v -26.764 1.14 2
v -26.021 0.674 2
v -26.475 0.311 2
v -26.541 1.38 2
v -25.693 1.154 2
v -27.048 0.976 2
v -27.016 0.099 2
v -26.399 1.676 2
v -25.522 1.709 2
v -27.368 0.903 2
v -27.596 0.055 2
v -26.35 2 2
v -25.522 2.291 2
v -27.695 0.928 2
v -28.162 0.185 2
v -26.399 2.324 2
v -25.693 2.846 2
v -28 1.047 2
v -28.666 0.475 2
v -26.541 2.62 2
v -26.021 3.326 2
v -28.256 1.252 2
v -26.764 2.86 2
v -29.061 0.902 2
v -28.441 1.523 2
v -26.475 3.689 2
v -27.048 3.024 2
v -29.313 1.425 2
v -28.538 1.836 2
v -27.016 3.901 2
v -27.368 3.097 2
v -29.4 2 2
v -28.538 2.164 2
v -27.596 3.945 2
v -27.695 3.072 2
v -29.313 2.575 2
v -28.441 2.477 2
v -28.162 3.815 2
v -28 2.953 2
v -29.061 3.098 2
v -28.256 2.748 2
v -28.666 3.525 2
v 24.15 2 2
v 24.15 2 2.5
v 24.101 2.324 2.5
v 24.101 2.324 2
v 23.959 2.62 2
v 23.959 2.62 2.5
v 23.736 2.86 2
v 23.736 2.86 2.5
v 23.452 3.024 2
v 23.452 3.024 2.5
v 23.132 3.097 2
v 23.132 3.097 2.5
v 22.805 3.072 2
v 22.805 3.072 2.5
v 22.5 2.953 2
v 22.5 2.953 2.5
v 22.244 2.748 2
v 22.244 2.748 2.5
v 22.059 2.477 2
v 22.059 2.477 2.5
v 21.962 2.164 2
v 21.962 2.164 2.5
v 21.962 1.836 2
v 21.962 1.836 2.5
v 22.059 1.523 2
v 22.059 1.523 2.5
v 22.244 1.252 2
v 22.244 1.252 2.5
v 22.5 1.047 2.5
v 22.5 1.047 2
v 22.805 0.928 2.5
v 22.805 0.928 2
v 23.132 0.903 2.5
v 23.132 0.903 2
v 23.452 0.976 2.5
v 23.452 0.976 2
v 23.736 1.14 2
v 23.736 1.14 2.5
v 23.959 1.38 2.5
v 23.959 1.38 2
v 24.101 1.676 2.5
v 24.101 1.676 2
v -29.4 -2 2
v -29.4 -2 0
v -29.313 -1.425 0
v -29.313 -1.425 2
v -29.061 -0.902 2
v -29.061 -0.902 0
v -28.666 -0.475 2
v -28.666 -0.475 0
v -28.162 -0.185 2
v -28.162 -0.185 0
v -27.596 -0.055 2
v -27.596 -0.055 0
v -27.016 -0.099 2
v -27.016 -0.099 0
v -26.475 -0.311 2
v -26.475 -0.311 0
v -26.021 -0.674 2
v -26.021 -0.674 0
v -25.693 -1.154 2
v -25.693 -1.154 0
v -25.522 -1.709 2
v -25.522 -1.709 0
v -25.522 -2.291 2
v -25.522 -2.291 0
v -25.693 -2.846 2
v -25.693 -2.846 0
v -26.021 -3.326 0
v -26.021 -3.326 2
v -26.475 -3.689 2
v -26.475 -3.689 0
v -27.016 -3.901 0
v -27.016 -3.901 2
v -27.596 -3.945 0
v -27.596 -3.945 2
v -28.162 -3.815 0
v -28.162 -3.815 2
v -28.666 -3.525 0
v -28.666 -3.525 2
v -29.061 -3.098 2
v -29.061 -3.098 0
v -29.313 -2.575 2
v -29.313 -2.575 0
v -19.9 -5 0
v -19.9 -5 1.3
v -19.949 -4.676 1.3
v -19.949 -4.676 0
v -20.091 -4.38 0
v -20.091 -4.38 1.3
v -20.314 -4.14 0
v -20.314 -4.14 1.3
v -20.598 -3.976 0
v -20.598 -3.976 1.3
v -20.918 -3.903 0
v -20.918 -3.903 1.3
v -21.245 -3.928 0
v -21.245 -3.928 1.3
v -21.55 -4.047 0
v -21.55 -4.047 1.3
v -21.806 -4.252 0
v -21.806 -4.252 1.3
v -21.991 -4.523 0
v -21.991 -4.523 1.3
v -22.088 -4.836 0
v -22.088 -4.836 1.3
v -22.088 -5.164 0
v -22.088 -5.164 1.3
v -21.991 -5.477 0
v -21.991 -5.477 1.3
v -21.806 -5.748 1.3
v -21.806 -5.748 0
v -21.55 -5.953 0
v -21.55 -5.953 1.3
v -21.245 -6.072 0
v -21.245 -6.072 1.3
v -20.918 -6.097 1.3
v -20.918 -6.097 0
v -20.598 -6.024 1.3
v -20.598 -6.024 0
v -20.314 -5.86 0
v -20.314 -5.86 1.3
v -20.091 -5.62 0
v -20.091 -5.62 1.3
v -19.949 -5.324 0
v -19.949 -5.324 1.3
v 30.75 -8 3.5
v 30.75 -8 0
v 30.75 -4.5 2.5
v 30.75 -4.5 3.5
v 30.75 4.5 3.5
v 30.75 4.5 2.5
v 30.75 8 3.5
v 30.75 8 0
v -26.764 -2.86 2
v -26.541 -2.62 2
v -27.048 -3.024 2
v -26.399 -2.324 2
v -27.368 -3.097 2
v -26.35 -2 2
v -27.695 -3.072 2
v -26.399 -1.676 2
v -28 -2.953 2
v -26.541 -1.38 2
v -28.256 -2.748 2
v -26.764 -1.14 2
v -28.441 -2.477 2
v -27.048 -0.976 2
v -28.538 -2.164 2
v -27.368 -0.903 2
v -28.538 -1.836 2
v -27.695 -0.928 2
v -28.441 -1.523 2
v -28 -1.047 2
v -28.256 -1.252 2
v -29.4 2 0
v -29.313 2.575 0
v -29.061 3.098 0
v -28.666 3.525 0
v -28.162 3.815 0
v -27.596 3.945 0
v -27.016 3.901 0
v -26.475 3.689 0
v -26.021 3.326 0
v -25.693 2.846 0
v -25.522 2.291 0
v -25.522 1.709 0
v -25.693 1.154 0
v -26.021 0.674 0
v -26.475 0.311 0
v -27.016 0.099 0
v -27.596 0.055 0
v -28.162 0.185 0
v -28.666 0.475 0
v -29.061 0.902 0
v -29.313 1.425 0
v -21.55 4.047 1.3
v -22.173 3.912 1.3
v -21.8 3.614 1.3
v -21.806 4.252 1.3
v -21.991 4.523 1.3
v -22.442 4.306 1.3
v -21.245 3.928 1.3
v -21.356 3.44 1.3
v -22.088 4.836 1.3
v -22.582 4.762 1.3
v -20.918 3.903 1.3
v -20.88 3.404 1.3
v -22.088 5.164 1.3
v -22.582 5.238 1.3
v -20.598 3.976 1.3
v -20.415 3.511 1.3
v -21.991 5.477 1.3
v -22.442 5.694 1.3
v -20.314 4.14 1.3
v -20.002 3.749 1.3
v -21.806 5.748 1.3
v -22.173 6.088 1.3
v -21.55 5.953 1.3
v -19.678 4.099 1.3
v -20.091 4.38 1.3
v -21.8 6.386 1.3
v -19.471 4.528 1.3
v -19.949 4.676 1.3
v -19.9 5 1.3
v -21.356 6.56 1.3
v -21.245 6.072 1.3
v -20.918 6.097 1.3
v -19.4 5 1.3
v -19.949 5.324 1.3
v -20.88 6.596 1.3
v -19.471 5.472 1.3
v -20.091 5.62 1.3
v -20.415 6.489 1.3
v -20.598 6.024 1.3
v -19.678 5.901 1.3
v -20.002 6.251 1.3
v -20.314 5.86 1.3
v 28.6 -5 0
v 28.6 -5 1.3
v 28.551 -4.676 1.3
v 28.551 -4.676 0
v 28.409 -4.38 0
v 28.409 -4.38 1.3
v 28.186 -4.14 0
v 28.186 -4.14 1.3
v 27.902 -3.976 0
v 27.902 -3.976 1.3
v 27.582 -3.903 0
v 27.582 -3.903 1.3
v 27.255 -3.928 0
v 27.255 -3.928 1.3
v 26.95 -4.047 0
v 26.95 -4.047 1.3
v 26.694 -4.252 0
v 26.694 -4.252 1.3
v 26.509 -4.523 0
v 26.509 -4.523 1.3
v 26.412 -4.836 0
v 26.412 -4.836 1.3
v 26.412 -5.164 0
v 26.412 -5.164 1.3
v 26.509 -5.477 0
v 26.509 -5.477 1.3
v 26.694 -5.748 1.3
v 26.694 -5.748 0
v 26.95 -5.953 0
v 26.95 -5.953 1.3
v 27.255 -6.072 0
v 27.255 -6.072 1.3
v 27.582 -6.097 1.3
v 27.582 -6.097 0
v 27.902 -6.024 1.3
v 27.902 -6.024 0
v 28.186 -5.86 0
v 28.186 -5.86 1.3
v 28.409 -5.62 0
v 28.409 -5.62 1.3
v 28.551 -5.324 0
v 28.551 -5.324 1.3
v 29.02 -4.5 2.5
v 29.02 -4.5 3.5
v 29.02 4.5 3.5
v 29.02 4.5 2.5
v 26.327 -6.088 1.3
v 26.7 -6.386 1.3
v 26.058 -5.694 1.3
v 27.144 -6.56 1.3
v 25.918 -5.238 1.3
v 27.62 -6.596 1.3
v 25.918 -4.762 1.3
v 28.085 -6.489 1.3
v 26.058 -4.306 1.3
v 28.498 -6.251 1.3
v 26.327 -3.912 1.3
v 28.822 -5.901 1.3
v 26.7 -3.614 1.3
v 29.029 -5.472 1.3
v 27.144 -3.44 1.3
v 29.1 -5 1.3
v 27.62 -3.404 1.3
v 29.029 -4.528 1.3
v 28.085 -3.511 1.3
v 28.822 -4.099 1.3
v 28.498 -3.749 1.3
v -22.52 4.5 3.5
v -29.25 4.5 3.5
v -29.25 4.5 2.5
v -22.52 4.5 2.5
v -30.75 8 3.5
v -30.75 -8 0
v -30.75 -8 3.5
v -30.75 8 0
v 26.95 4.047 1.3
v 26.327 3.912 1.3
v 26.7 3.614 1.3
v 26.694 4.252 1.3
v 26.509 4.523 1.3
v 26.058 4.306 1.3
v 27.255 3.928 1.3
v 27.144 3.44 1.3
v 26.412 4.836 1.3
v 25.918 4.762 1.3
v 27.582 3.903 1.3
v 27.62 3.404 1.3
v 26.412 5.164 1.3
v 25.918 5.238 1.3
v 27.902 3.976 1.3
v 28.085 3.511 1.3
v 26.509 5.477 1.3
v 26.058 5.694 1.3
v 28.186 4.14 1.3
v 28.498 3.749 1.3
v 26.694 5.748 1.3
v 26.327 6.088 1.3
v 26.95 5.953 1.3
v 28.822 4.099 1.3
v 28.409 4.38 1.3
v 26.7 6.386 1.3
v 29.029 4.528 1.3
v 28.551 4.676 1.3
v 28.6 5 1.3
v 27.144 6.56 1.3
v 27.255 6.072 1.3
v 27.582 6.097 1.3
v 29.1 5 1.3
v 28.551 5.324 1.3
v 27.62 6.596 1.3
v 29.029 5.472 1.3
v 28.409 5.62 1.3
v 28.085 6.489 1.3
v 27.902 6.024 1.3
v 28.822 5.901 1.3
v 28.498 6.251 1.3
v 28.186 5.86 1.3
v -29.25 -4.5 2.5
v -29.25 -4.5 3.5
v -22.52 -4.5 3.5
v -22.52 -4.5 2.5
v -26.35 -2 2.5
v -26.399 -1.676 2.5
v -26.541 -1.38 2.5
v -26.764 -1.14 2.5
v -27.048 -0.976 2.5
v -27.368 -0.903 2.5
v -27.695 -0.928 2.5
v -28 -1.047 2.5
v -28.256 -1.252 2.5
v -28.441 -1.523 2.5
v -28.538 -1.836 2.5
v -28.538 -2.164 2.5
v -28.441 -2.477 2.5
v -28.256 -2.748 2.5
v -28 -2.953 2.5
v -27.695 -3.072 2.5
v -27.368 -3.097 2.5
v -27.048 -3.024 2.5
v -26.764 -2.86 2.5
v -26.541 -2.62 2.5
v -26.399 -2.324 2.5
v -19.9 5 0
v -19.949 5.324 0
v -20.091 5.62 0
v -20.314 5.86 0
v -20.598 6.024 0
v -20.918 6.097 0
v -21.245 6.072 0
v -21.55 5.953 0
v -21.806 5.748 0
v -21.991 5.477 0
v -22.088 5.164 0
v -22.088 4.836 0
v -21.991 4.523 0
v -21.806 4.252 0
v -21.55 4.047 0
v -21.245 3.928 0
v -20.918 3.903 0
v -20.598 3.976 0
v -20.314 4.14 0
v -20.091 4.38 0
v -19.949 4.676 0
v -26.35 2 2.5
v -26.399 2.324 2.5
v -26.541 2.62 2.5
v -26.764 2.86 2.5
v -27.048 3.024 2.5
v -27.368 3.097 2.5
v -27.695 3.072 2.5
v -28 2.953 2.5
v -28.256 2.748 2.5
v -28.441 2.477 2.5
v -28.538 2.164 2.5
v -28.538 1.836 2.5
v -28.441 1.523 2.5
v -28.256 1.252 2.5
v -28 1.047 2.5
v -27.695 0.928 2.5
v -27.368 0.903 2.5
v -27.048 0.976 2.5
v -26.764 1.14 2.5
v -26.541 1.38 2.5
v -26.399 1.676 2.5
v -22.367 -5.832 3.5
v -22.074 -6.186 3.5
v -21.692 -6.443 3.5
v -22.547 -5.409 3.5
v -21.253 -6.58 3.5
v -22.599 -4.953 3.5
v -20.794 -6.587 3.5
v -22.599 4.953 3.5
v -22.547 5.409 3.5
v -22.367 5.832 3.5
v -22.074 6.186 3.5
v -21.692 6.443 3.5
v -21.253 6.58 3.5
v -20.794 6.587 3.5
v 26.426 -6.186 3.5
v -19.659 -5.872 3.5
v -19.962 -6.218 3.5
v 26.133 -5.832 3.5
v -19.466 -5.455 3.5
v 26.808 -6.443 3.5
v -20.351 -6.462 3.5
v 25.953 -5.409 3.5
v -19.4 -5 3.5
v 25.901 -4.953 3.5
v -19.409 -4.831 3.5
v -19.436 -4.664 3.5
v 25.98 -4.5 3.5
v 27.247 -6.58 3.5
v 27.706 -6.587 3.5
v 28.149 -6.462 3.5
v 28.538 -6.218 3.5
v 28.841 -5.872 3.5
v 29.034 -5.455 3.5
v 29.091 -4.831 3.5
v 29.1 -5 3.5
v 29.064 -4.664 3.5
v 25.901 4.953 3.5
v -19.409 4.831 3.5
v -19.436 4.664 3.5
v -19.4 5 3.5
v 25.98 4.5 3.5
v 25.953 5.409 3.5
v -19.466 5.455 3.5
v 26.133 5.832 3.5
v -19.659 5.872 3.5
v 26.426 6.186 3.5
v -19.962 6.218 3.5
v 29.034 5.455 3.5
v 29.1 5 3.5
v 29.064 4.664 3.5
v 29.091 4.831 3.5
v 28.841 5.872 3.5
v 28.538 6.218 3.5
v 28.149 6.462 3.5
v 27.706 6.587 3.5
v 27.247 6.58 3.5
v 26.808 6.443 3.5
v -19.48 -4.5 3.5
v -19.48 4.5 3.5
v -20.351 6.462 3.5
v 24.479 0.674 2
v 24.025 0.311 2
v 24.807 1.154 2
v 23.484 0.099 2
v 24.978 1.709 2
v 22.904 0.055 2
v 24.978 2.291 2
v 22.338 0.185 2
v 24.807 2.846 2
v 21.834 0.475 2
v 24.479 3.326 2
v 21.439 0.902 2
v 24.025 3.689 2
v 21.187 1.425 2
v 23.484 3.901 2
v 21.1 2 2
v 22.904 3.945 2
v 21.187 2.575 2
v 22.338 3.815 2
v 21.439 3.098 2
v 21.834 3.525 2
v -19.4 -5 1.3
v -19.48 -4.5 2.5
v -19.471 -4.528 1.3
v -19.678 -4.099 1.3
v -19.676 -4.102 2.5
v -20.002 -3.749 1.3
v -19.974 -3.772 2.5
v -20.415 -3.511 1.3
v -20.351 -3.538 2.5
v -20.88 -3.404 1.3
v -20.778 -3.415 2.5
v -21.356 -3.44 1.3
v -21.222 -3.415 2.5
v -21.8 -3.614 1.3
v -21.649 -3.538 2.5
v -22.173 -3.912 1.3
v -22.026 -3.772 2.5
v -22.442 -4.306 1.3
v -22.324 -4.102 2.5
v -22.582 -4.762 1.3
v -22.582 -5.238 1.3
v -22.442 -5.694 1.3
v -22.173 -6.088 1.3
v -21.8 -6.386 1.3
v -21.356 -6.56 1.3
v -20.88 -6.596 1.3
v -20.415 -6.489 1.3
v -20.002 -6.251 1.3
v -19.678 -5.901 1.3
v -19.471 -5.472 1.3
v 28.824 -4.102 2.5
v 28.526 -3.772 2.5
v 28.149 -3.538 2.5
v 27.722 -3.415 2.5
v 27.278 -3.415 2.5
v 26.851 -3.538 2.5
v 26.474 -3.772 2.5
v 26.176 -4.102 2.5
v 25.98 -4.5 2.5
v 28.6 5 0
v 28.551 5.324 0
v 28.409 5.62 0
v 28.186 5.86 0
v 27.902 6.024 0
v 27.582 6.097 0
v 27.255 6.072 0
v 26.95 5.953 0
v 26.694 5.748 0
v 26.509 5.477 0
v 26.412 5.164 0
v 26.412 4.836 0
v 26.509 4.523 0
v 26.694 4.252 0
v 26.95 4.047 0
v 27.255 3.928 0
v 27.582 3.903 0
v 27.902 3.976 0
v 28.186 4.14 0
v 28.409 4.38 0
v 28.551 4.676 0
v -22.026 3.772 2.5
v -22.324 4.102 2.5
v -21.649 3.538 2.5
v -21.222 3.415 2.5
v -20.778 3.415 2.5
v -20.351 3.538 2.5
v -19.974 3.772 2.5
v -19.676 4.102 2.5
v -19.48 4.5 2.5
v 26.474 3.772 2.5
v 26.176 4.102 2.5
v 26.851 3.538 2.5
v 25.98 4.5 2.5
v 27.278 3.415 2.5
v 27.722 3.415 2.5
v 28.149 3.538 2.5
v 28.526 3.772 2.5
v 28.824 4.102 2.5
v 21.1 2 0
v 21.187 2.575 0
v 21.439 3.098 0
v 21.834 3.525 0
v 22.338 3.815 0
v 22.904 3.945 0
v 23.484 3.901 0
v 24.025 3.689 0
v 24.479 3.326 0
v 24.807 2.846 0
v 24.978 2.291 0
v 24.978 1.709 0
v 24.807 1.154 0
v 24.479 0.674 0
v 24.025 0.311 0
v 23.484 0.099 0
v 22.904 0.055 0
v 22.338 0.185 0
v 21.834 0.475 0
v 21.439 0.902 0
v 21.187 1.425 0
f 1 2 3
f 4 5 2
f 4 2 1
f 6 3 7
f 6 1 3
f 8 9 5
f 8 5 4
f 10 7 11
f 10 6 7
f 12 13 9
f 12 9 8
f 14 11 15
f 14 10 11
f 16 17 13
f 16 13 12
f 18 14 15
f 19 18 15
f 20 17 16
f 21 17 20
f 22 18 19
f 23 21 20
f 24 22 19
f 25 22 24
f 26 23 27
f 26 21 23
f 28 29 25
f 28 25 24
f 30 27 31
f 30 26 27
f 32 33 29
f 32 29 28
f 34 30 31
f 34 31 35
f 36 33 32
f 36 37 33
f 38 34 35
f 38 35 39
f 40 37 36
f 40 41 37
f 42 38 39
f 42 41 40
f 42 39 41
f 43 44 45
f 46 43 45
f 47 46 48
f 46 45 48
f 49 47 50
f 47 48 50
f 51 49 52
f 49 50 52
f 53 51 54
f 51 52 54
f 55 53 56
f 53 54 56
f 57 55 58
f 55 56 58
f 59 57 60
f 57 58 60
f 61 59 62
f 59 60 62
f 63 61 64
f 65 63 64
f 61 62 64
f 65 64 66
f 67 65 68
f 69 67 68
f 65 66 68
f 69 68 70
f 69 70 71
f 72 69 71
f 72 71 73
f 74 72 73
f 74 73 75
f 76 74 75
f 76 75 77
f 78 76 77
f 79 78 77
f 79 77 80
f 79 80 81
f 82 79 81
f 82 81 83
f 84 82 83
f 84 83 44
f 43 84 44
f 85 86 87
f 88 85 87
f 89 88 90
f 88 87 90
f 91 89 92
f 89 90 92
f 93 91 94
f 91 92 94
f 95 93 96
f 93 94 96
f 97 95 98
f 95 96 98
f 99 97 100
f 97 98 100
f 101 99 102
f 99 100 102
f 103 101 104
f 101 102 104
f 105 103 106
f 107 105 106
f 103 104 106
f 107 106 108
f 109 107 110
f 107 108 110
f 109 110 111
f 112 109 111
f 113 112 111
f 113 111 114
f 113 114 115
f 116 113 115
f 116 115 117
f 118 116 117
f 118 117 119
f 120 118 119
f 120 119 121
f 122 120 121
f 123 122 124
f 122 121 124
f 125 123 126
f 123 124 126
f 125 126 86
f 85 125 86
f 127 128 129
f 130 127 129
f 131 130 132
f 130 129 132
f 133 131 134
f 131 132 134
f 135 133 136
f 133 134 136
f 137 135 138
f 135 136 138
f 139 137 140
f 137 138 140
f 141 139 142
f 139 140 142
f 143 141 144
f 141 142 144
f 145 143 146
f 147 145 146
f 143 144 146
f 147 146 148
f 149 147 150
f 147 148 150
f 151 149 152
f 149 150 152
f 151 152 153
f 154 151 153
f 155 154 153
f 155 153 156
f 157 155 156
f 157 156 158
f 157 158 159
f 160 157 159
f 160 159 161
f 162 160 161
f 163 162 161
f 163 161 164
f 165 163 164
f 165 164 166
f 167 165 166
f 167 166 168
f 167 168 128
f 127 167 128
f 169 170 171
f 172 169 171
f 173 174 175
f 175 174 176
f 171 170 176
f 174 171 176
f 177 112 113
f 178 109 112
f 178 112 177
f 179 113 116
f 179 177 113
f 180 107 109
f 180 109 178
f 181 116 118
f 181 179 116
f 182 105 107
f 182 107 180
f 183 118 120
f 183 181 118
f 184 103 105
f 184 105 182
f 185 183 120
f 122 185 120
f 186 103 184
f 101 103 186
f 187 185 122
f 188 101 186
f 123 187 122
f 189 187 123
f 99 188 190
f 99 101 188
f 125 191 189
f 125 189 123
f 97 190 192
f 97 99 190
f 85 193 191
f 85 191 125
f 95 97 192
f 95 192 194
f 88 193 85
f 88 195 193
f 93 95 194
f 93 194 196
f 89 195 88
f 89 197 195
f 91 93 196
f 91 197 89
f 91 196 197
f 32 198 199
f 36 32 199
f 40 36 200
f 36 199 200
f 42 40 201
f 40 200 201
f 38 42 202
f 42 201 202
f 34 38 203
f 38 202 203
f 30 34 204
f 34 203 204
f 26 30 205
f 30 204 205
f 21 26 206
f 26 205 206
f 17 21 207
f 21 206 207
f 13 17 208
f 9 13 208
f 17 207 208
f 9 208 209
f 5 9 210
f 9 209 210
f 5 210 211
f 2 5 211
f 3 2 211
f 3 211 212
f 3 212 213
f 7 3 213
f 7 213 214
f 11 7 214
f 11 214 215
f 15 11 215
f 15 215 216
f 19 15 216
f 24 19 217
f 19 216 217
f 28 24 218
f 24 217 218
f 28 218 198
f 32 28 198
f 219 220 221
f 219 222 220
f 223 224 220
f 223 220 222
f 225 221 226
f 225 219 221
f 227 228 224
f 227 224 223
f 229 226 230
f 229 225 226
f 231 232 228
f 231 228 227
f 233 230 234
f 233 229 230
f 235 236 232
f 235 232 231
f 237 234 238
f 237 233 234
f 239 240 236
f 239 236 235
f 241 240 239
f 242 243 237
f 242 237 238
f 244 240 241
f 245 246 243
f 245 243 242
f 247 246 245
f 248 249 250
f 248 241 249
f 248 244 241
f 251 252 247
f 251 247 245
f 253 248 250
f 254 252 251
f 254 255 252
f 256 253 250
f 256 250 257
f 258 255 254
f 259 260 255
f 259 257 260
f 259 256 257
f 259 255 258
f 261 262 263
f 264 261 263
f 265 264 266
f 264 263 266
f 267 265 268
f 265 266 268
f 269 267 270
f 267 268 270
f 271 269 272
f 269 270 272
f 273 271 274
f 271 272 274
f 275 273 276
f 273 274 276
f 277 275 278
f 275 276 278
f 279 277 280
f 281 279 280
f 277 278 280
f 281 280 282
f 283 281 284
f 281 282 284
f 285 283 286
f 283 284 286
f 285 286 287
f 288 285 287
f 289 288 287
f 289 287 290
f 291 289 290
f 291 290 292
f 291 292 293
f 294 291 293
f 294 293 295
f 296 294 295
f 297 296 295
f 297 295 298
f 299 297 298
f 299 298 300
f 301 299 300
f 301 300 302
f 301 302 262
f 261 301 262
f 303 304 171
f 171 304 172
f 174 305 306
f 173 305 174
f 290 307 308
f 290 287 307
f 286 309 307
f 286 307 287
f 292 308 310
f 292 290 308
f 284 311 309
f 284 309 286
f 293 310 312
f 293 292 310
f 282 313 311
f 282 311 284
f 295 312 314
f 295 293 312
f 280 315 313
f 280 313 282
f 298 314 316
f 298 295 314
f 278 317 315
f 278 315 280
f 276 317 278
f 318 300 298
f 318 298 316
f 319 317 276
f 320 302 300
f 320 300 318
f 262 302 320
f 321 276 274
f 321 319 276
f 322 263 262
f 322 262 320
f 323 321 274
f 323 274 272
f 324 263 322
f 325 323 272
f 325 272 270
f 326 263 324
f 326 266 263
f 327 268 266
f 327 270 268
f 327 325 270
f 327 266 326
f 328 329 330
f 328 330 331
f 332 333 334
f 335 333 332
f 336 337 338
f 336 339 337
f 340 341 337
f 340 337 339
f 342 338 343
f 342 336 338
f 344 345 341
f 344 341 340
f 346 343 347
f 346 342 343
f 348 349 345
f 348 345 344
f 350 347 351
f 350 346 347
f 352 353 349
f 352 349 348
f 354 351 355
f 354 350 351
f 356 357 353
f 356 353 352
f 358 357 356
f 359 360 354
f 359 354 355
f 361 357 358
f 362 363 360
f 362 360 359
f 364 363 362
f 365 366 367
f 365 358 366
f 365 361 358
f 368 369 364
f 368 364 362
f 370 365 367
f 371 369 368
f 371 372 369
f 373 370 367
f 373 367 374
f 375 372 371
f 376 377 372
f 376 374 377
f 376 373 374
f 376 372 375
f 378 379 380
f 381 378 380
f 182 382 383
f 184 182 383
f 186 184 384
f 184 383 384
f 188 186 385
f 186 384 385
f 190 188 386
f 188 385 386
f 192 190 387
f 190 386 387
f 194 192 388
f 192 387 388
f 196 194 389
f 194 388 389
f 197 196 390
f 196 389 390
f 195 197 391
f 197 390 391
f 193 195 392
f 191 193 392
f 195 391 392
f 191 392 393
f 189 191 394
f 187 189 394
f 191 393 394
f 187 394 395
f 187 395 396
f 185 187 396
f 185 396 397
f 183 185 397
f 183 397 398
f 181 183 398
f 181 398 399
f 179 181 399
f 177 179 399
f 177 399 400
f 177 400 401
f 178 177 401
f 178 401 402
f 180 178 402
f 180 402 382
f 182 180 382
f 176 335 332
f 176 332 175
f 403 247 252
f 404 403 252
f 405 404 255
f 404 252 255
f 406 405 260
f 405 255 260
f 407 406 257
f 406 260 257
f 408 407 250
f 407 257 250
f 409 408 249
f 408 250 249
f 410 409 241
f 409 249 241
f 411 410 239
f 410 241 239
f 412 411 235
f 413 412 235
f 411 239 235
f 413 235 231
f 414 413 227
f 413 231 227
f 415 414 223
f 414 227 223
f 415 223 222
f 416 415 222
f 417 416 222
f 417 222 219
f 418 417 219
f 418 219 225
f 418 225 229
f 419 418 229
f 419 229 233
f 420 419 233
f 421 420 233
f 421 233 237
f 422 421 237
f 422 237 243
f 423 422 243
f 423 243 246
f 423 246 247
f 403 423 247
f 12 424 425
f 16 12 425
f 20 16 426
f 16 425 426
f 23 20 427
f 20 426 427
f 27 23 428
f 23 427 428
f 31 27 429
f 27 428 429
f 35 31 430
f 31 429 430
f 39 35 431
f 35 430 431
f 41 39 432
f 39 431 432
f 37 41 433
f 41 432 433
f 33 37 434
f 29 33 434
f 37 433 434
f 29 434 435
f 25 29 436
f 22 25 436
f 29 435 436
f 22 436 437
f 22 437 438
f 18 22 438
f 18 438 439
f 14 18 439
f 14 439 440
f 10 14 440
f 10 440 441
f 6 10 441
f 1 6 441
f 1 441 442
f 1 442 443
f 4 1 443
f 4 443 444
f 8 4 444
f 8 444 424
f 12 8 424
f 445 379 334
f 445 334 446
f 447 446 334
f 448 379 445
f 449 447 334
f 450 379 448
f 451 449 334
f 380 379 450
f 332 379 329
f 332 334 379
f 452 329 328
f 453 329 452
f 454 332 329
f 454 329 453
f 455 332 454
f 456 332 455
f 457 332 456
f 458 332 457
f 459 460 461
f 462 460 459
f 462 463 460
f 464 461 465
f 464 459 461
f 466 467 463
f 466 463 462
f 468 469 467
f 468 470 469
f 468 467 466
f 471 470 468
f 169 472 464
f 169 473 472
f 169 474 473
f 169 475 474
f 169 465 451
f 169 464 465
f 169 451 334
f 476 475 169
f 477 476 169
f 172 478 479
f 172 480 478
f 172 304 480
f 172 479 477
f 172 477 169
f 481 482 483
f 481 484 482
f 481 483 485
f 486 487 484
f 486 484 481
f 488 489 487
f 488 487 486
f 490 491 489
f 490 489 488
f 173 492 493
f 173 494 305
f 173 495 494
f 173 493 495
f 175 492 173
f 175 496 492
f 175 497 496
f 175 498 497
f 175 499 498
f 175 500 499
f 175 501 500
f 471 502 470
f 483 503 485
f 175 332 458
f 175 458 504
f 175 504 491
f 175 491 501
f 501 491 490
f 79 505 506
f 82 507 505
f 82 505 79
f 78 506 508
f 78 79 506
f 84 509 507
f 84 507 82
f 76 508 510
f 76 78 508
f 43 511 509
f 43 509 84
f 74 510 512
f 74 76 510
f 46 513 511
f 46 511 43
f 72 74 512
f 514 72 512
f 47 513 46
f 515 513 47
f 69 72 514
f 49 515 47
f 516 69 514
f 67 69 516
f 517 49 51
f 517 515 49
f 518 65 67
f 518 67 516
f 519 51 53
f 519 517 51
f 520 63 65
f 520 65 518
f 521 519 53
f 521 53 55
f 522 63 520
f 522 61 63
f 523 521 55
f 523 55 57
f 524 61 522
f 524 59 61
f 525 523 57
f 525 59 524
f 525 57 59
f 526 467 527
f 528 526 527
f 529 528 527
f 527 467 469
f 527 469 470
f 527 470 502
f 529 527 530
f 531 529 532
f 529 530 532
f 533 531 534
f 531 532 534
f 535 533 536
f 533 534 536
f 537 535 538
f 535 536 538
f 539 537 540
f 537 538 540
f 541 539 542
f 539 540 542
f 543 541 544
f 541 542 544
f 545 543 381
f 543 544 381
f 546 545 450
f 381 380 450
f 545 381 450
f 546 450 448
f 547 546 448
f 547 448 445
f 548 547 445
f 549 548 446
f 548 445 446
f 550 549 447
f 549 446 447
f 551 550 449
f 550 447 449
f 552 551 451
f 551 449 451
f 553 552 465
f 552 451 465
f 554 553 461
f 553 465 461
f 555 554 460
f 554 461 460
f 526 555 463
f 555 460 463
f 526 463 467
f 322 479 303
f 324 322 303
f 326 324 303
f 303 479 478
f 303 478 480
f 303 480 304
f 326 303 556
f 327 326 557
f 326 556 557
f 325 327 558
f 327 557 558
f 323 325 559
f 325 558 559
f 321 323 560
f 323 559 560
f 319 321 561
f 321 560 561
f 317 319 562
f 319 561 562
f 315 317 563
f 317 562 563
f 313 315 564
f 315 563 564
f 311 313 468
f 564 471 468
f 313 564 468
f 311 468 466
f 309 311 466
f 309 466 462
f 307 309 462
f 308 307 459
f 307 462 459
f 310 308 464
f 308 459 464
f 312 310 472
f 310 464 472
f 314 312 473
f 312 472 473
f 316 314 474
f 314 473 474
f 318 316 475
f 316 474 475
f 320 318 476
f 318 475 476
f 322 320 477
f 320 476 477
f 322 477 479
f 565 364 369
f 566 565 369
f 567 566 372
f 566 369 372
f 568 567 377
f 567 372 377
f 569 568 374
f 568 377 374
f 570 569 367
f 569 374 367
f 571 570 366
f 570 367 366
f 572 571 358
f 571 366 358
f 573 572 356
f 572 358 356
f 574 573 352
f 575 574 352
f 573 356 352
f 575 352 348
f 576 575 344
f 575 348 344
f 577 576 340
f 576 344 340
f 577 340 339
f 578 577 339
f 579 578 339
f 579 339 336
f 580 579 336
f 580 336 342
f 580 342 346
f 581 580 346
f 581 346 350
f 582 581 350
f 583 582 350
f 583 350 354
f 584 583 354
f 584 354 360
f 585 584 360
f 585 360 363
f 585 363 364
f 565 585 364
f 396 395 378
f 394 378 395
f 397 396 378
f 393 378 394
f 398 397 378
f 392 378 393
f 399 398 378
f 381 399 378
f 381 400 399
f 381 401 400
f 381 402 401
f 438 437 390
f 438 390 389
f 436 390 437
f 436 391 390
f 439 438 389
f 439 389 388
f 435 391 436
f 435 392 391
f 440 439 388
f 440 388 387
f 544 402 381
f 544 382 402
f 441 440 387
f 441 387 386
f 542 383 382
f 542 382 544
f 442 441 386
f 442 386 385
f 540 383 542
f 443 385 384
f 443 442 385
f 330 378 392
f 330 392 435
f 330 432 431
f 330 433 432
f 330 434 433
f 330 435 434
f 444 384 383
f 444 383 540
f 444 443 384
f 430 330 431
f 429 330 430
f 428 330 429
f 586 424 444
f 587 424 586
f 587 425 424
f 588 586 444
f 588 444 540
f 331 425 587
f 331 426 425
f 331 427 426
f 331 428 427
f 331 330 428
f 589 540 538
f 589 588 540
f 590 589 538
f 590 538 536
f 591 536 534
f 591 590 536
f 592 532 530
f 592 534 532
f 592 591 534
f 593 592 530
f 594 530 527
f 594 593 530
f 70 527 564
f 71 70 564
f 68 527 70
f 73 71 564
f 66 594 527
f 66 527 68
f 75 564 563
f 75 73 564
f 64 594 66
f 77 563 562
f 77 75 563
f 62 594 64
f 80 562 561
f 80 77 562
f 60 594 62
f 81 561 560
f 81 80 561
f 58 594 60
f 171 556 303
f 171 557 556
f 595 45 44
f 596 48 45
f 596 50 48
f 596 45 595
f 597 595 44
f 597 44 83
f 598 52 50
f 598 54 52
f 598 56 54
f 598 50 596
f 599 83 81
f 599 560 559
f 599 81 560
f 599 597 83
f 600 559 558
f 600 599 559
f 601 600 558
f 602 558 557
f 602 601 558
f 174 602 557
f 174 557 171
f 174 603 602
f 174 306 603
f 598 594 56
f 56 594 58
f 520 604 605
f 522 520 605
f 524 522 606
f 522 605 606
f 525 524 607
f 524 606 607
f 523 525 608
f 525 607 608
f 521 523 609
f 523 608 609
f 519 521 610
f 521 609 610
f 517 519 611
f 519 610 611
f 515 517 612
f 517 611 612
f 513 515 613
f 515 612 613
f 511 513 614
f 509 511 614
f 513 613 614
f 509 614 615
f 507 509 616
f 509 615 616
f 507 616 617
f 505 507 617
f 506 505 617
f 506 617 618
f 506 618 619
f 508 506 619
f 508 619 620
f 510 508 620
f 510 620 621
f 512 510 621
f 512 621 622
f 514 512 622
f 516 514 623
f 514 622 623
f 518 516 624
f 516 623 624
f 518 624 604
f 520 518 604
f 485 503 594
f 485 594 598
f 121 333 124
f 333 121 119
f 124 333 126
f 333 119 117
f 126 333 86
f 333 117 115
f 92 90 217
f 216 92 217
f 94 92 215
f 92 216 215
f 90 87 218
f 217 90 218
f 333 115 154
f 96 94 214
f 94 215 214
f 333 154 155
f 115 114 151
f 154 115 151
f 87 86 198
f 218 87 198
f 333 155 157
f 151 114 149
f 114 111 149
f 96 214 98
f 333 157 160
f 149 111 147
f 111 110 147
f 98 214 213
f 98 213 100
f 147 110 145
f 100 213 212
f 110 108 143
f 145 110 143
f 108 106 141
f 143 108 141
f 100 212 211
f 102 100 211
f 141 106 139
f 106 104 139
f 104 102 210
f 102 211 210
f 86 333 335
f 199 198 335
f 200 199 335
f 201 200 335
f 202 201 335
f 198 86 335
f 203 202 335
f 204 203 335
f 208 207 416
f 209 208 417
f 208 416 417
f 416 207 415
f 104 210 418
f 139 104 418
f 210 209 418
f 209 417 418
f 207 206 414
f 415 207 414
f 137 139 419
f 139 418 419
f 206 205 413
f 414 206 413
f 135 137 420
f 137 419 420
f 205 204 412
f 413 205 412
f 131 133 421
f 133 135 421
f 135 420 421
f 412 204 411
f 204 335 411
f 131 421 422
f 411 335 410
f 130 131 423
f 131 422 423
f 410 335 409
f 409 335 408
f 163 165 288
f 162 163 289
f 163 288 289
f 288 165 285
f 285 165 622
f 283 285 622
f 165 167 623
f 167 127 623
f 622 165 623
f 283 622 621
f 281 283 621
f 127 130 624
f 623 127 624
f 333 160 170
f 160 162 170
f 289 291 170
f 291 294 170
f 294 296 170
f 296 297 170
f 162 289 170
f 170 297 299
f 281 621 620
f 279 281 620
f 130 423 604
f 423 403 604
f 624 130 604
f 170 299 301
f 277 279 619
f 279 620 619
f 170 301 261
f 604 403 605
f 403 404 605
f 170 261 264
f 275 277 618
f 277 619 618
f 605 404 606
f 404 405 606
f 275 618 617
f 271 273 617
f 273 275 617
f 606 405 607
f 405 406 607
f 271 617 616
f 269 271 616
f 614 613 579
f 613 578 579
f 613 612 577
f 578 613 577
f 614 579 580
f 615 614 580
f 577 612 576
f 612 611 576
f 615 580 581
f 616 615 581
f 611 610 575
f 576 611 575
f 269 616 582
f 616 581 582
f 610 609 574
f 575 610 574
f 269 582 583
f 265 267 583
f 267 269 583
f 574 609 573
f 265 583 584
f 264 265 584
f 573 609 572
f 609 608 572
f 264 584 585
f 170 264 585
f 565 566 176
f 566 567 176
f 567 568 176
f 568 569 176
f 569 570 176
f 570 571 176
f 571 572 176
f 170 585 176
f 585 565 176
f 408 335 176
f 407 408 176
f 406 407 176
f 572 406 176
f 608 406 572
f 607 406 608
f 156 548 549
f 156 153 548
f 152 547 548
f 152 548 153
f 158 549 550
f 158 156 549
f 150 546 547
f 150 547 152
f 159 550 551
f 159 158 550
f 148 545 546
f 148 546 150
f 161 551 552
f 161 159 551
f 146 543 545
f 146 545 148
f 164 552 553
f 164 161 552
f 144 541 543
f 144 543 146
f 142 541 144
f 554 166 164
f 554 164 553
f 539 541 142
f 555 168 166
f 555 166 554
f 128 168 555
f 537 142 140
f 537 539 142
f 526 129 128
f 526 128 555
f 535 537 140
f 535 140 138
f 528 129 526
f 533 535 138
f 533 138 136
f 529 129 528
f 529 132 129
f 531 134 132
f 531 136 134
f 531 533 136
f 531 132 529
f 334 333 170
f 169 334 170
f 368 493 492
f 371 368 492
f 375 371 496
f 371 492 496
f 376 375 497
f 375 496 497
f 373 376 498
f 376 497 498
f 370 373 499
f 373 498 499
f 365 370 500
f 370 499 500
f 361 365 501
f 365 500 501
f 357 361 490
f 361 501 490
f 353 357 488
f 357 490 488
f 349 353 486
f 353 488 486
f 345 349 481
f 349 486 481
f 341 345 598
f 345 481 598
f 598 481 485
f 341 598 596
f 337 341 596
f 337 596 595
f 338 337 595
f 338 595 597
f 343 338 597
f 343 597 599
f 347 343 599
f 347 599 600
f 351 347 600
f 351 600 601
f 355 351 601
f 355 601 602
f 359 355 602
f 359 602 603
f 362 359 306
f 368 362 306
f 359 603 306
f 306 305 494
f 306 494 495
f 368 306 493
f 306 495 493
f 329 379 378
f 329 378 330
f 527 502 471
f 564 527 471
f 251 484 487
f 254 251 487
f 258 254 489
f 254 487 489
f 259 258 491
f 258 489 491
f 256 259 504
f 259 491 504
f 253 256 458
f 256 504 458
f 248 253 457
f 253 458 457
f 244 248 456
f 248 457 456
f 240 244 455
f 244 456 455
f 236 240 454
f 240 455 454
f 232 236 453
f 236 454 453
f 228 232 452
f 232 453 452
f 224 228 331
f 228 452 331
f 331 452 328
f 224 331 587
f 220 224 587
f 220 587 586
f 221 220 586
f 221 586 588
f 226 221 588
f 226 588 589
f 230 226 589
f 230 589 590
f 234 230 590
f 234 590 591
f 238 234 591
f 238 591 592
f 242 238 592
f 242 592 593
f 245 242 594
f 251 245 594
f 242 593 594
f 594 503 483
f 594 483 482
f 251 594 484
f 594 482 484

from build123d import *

# Parameters (mm, degrees)
SKETCH1_W           = 61.5
SKETCH1_H           = 16
BOSS_EXTRUDE1_DEPTH = 3.5
SKETCH5_W           = 60
SKETCH5_H           = 9
CUT_EXTRUDE3_DEPTH  = 1
SKETCH6_R           = 1.1
CUT_EXTRUDE4_DEPTH  = 32.871813566
SKETCH7_R           = 1.6
CUT_EXTRUDE5_DEPTH  = 2.2
SKETCH8_R           = 1.1
CUT_EXTRUDE6_DEPTH  = 32.871813566
SKETCH11_R          = 1.95
CUT_EXTRUDE10_DEPTH = 2


with BuildPart() as part:
    # Sketch1 → Boss-Extrude1 (new body)
    with BuildSketch(Plane.XY):
        Rectangle(SKETCH1_W, SKETCH1_H)
    extrude(amount=BOSS_EXTRUDE1_DEPTH)

    # Sketch5 → Cut-Extrude3 (cut)
    with BuildSketch(Plane.XY.offset(3.5)):
        with Locations((0.75, 0)):
            Rectangle(SKETCH5_W, SKETCH5_H)
    extrude(amount=-CUT_EXTRUDE3_DEPTH, mode=Mode.SUBTRACT)

    # Sketch6 → Cut-Extrude4 (cut, through all)
    with BuildSketch(Plane.XY.offset(2.5)):
        with Locations((-27.45, 2)):
            Circle(SKETCH6_R)
        with Locations((-27.45, -2)):
            Circle(SKETCH6_R)
        with Locations((23.05, 2)):
            Circle(SKETCH6_R)
    extrude(amount=-CUT_EXTRUDE4_DEPTH, mode=Mode.SUBTRACT)

    # Sketch7 → Cut-Extrude5 (cut)
    with BuildSketch(Plane.XY.offset(3.5)):
        with Locations((-21, 5)):
            Circle(SKETCH7_R)
        with Locations((-21, -5)):
            Circle(SKETCH7_R)
        with Locations((27.5, 5)):
            Circle(SKETCH7_R)
        with Locations((27.5, -5)):
            Circle(SKETCH7_R)
    extrude(amount=-CUT_EXTRUDE5_DEPTH, mode=Mode.SUBTRACT)

    # Sketch8 → Cut-Extrude6 (cut, through all)
    with BuildSketch(Plane.XY.offset(2.5)):
        with Locations((-21, 5)):
            Circle(SKETCH8_R)
        with Locations((-21, -5)):
            Circle(SKETCH8_R)
        with Locations((27.5, 5)):
            Circle(SKETCH8_R)
        with Locations((27.5, -5)):
            Circle(SKETCH8_R)
    extrude(amount=-CUT_EXTRUDE6_DEPTH, mode=Mode.SUBTRACT)

    # Sketch11 → Cut-Extrude10 (cut)
    with BuildSketch(Plane(origin=(0, 0, 0), x_dir=(-1, 0, 0), z_dir=(0, 0, -1))):
        with Locations((-23.05, 2)):
            Circle(SKETCH11_R)
        with Locations((27.45, -2)):
            Circle(SKETCH11_R)
        with Locations((27.45, 2)):
            Circle(SKETCH11_R)
    extrude(amount=-CUT_EXTRUDE10_DEPTH, mode=Mode.SUBTRACT)


solid = part.part
